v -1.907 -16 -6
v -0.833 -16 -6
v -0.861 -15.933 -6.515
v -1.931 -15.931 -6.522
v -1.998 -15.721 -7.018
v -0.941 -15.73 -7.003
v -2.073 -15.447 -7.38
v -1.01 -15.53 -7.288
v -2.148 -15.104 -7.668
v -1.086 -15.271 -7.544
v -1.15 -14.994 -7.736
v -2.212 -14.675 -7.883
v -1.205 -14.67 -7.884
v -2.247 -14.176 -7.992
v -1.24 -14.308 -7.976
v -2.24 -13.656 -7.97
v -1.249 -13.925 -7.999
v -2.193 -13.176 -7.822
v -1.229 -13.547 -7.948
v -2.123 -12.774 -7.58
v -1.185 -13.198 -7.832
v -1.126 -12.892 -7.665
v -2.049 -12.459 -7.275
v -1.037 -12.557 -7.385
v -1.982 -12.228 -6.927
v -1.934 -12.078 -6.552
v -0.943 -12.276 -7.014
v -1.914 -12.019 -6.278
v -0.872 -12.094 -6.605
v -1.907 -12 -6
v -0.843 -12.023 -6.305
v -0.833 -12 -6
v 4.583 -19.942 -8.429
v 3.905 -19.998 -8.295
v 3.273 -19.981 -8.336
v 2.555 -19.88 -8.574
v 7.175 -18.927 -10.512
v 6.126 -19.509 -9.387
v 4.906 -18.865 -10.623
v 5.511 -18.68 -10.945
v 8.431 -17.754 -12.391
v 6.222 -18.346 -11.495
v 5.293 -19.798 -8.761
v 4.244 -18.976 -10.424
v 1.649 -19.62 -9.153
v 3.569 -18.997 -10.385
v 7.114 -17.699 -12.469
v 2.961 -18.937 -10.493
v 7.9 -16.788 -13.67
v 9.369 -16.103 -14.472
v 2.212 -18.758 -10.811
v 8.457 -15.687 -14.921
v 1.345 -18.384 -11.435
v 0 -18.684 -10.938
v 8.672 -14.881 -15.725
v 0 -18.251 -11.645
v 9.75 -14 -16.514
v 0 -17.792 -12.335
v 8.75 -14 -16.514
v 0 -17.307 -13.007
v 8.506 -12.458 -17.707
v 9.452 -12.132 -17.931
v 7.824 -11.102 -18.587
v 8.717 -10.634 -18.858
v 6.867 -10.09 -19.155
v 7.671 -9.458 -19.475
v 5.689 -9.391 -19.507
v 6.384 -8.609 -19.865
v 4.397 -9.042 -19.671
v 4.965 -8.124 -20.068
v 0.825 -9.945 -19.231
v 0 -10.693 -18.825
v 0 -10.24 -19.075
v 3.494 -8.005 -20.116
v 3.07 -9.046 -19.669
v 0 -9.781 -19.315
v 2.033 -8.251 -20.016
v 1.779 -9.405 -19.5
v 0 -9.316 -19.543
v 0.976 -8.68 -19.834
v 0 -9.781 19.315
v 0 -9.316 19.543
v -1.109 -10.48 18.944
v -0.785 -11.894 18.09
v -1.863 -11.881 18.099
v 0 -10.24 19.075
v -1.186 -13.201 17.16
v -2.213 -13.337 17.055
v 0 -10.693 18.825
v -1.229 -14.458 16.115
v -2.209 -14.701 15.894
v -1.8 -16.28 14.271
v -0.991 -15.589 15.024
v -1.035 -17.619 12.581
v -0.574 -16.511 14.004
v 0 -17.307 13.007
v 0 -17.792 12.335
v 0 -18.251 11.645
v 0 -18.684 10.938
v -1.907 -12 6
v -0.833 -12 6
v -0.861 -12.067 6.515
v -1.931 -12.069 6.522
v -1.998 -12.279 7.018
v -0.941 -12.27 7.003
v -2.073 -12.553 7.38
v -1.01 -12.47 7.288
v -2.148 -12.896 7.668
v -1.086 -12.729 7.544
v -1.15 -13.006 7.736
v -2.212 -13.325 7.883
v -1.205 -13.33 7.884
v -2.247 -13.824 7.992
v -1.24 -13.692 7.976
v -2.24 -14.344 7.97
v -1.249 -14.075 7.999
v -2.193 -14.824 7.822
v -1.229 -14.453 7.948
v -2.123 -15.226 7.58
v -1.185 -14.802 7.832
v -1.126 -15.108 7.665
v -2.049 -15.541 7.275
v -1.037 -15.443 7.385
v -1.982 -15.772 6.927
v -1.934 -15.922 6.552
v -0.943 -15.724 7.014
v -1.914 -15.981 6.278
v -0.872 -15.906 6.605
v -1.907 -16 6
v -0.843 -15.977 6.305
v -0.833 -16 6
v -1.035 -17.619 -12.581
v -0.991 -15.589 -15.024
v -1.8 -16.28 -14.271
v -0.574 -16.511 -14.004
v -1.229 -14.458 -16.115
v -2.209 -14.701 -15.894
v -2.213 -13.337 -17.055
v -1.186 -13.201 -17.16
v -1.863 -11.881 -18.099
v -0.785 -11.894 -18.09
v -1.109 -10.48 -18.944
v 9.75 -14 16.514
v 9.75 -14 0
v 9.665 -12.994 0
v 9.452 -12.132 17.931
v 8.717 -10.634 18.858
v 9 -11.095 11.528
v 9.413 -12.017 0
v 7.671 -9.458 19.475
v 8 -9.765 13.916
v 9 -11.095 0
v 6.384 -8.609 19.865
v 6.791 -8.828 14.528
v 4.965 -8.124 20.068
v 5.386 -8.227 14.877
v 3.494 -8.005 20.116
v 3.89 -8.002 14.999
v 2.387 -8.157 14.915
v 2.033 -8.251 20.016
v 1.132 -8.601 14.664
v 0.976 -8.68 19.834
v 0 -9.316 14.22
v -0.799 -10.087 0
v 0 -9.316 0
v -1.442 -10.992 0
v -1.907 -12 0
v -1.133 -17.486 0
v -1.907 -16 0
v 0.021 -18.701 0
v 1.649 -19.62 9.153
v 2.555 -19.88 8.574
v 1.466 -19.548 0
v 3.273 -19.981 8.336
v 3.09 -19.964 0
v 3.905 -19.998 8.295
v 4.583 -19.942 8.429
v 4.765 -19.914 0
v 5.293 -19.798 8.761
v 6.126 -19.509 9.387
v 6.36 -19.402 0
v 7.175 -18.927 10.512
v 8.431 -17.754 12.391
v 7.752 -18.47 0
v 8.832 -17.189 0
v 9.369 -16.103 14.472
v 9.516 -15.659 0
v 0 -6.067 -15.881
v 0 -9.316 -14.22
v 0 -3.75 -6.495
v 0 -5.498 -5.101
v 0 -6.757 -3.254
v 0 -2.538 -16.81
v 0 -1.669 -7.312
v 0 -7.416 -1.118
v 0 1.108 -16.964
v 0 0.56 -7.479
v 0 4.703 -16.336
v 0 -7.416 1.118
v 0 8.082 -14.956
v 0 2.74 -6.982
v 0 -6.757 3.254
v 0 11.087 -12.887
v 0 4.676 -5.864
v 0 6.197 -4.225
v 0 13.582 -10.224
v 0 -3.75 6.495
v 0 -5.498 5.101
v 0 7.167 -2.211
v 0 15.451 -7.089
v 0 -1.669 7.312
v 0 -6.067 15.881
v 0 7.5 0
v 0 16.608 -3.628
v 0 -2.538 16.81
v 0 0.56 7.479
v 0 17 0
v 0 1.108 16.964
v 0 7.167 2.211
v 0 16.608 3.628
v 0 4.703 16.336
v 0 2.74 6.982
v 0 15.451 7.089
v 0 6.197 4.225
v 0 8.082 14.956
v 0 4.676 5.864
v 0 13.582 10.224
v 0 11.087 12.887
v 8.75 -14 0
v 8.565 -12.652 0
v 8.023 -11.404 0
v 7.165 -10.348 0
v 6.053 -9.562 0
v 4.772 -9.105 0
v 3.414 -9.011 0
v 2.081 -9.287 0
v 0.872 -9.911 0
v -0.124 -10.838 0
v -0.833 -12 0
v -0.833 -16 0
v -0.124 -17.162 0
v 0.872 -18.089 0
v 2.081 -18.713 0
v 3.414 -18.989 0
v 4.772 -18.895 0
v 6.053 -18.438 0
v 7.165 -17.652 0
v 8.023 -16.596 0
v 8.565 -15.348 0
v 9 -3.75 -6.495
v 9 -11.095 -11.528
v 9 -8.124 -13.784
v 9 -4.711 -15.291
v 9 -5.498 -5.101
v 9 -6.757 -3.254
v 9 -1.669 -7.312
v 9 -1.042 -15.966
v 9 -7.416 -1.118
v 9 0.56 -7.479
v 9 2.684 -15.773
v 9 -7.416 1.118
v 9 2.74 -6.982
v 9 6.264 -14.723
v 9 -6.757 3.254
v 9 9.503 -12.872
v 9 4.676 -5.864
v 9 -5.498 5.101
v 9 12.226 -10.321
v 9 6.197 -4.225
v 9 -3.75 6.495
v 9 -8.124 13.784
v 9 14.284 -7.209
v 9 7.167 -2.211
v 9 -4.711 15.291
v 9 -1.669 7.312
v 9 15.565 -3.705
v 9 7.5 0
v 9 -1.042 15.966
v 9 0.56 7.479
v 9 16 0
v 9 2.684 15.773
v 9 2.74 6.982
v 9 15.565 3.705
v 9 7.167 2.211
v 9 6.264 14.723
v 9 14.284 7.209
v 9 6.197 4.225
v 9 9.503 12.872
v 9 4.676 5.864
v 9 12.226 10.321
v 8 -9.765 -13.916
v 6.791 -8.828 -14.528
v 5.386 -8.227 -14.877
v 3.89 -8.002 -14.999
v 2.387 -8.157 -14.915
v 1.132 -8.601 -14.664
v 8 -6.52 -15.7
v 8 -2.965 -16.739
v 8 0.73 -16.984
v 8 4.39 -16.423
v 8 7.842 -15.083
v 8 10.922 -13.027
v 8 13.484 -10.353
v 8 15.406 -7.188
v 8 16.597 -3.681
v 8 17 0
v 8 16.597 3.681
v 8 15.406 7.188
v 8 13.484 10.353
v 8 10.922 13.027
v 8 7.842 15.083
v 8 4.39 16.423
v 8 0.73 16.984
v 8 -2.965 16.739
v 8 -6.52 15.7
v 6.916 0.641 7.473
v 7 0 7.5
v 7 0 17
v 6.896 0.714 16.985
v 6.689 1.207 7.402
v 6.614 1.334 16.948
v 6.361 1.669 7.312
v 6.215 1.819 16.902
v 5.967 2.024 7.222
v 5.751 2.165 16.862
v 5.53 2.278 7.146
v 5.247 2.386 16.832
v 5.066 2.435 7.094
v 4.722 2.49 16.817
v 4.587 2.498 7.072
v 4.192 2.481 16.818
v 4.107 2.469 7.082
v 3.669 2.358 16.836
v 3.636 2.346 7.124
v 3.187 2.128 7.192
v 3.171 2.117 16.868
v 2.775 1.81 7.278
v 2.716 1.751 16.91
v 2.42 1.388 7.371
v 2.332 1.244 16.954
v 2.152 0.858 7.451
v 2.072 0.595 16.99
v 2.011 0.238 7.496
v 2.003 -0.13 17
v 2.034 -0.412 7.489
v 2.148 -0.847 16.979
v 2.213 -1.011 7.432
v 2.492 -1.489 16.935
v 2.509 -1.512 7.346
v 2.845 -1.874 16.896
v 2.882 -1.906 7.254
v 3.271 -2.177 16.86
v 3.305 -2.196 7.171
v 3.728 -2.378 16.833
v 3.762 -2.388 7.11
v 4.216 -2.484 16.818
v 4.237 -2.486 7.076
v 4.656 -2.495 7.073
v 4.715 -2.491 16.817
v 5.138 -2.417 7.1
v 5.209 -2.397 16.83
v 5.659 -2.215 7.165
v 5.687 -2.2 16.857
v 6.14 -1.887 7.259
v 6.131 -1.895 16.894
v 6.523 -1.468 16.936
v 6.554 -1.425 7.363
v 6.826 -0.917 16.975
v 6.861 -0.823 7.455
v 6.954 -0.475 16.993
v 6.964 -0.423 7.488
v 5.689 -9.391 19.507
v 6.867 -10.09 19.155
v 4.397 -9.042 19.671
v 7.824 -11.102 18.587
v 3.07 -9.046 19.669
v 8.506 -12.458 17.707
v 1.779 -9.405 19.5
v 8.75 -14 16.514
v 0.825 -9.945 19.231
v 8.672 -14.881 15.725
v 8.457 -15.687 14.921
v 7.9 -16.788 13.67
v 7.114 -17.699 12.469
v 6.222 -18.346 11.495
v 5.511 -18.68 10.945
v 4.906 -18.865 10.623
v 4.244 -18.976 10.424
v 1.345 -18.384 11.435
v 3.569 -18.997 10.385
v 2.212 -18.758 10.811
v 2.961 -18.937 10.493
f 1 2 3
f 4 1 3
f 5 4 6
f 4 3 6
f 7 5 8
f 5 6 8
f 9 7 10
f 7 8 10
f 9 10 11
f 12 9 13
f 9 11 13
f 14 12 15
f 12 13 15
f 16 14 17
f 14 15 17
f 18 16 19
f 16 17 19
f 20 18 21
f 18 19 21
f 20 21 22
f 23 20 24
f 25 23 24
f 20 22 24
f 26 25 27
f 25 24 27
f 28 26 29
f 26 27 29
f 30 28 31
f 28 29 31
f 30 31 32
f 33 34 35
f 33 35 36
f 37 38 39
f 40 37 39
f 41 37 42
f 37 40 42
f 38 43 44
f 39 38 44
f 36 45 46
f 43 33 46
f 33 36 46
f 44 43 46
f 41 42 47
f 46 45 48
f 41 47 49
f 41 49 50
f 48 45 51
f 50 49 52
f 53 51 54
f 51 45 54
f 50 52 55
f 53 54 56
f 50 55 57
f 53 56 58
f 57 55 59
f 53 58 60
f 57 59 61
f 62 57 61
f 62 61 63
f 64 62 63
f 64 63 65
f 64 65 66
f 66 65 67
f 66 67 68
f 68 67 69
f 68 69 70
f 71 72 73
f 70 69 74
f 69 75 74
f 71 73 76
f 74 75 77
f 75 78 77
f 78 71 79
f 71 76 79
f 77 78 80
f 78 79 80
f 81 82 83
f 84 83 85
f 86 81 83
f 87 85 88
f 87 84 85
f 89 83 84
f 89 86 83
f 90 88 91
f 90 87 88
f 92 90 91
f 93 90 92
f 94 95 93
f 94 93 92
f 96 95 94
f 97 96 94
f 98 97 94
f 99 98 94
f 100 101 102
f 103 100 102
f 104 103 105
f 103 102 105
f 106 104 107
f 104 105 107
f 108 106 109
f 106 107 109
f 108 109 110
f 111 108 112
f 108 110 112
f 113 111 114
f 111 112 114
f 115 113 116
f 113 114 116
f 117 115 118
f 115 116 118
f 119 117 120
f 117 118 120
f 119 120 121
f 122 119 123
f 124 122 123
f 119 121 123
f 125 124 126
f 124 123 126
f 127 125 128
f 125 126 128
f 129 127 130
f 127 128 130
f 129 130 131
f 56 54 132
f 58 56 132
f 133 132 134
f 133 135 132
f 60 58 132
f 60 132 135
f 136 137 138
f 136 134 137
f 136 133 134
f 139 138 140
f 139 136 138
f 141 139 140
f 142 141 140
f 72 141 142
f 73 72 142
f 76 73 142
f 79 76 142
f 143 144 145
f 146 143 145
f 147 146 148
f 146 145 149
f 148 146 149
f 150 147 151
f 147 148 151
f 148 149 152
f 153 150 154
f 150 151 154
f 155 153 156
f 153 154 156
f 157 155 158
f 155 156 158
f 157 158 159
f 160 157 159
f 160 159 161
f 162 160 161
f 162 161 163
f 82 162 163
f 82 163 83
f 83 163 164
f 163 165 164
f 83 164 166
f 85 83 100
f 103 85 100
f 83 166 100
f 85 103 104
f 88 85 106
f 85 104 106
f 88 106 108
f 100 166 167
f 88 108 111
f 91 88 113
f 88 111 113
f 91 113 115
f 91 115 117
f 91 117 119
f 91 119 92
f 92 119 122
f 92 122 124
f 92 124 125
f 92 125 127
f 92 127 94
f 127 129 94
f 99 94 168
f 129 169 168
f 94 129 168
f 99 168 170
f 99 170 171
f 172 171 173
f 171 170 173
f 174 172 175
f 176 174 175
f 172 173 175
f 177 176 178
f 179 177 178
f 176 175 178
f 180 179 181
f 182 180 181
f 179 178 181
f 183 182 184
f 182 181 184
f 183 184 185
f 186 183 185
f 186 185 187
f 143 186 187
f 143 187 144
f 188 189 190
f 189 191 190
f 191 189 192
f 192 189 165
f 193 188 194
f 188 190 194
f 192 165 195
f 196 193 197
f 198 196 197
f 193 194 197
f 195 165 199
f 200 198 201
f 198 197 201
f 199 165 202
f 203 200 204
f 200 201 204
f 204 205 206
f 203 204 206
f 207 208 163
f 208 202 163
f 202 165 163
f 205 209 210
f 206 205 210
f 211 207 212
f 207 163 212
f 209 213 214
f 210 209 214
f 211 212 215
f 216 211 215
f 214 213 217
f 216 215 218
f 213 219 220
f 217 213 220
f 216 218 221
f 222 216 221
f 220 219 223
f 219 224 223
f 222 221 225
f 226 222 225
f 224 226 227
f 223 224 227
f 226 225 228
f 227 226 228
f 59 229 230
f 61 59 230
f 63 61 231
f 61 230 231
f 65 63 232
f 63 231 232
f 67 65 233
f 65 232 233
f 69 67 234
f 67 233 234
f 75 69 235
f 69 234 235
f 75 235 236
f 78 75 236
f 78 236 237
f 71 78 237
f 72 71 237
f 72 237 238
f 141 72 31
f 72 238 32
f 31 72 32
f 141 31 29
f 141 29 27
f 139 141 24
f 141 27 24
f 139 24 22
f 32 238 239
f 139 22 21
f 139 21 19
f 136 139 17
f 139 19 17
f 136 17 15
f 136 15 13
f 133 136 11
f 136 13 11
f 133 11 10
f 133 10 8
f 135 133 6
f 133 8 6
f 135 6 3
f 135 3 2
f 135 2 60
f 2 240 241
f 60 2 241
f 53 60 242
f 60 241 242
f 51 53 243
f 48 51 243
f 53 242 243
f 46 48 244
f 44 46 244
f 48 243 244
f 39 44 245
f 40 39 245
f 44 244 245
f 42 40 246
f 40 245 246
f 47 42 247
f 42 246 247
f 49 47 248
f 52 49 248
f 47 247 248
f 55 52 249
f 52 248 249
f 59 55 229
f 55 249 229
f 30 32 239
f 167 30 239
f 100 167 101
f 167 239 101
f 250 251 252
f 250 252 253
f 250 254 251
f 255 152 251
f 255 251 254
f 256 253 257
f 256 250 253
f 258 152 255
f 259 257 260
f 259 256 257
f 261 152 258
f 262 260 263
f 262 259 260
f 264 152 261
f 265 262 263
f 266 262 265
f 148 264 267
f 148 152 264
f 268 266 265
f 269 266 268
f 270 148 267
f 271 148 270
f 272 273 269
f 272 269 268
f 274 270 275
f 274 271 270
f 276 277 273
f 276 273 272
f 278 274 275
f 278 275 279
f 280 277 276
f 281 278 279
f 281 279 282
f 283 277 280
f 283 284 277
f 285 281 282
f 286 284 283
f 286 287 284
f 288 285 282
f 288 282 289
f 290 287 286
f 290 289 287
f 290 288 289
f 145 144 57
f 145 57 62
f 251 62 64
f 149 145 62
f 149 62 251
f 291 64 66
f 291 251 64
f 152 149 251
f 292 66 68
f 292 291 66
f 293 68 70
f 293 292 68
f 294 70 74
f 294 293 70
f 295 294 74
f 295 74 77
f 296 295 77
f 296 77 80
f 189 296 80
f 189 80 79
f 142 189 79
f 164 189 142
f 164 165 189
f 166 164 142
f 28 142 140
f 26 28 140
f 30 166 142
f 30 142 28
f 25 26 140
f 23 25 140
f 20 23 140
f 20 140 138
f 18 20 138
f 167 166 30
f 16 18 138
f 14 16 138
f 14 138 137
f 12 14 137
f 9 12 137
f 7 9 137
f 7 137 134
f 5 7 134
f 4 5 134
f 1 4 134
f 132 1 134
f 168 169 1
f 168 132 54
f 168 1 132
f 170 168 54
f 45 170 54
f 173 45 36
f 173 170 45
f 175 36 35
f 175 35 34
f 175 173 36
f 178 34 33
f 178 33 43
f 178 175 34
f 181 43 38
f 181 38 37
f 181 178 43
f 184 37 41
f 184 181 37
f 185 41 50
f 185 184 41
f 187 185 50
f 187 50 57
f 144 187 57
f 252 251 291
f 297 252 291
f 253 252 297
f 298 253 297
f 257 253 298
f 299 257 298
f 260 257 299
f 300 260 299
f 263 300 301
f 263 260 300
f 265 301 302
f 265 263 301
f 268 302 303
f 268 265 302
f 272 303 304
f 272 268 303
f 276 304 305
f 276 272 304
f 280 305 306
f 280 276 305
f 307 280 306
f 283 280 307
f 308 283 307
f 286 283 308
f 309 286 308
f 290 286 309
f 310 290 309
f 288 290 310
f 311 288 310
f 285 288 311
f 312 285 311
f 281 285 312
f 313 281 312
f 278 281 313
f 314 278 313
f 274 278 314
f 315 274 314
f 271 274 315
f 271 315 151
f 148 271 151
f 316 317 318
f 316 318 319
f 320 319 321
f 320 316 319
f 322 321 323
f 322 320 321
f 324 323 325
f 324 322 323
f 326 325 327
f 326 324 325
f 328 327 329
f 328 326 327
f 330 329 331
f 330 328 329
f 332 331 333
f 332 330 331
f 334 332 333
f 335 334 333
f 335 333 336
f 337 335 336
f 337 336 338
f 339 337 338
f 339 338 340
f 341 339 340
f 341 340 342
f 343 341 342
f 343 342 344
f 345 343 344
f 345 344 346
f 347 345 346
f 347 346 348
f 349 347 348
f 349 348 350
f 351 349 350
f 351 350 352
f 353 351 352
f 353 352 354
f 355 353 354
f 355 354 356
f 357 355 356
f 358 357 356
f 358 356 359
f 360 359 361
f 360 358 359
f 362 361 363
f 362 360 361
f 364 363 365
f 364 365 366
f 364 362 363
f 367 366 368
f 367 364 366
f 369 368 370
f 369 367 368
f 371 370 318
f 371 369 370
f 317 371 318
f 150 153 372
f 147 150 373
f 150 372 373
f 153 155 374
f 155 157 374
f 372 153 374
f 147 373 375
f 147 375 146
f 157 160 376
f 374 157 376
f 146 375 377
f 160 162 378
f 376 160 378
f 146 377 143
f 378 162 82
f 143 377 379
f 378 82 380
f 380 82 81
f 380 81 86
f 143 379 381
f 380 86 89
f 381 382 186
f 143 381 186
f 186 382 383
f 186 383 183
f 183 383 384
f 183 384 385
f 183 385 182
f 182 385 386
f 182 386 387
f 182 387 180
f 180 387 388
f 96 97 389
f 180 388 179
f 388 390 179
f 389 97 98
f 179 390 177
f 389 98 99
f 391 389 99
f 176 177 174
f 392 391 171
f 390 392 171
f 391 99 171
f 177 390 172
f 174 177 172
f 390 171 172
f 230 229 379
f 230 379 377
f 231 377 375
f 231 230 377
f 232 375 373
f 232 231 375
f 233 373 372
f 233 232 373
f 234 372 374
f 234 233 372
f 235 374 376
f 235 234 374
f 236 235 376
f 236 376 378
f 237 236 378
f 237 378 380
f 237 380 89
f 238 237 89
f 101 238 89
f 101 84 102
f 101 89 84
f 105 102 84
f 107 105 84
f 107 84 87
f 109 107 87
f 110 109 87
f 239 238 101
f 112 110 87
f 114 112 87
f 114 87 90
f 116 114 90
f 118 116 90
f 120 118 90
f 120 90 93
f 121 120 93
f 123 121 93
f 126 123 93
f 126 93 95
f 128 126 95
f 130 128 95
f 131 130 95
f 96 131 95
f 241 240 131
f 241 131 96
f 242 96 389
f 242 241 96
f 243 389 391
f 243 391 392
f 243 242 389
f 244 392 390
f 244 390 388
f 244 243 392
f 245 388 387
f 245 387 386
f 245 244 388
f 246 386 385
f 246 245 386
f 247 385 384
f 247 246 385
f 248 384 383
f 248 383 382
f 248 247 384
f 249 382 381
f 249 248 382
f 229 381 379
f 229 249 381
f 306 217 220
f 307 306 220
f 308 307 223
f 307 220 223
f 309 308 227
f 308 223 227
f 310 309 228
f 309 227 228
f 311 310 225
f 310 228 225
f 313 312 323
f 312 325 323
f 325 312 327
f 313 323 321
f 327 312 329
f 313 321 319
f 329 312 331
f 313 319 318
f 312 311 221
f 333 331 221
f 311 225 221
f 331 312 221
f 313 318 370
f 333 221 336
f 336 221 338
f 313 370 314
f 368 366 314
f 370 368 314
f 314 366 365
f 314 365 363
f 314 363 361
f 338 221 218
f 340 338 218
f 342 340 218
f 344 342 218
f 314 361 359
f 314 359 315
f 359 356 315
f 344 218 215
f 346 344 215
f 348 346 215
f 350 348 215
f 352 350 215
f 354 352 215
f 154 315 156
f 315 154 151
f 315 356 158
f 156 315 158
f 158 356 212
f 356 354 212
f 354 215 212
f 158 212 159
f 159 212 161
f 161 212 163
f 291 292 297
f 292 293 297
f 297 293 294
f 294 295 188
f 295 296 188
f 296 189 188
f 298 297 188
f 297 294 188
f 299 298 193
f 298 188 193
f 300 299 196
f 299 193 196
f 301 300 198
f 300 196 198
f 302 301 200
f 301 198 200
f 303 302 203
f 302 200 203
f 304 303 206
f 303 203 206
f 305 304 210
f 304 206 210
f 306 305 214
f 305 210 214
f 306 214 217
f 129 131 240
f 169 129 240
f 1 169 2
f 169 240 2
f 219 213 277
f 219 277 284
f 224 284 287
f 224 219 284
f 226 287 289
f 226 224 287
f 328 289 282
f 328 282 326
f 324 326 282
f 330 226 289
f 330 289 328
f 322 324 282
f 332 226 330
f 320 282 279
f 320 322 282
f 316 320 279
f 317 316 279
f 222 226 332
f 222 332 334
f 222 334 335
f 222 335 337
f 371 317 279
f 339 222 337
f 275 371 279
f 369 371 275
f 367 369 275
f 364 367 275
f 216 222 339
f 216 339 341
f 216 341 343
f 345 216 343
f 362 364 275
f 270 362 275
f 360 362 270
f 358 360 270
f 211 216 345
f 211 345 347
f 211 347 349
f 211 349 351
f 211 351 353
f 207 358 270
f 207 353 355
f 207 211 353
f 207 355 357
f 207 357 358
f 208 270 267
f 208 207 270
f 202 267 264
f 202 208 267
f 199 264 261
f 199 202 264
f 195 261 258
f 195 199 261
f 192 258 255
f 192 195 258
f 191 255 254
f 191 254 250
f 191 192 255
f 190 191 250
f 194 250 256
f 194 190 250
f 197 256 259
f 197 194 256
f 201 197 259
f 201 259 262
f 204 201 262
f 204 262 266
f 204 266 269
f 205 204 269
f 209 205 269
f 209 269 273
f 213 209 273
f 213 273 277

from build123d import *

# Parameters (mm, degrees)
F0_R           = 17
F0_R_2         = 7.5
F1_DEPTH       = 9
F3_SIZE        = 1
F2_R           = 2.5
F4_DEPTH       = 25
F5_R           = 6
F6_DEPTH       = 25
F6_DEPTH_BACK  = 25
F7_R           = 36.9830222821
F7_R_2         = 21.65
F8_DEPTH       = 25
F8_DEPTH_BACK  = 25
F9_R           = 5
F10_DEPTH      = 25
F10_DEPTH_BACK = 25
F12_DEPTH      = 25


with BuildPart() as f1:
    # F0 (on Right) → F1 (new body)
    with BuildSketch(Plane.YZ):
        Circle(F0_R)
        Circle(F0_R_2, mode=Mode.SUBTRACT)
    extrude(amount=F1_DEPTH)

    # F3
    f3_edges = [f1.edges().sort_by_distance(p)[0] for p in [
        (9, -17, 0),
    ]]
    chamfer(f3_edges, length=F3_SIZE)

    # F2 (on Top) → F4 (cut)
    with BuildSketch(Plane.XY):
        with Locations((4.5, 0)):
            Circle(F2_R)
    extrude(amount=F4_DEPTH, mode=Mode.SUBTRACT)

    # F5 (on Top) → F6 (join, two sides)
    with BuildSketch(Plane.XY) as f6_sk:
        with Locations((3.75, -14)):
            Circle(F5_R)
    extrude(amount=F6_DEPTH)
    extrude(f6_sk.sketch, amount=-F6_DEPTH_BACK)

    # F7 (on Right) → F8 (cut, two sides)
    with BuildSketch(Plane.YZ) as f8_sk:
        Circle(F7_R)
        Circle(F7_R_2, mode=Mode.SUBTRACT)
    extrude(amount=F8_DEPTH, mode=Mode.SUBTRACT)
    extrude(f8_sk.sketch, amount=-F8_DEPTH_BACK, mode=Mode.SUBTRACT)

    # F9 (on Top) → F10 (cut, two sides)
    with BuildSketch(Plane.XY) as f10_sk:
        with Locations((3.75, -14)):
            Circle(F9_R)
    extrude(amount=-F10_DEPTH, mode=Mode.SUBTRACT)
    extrude(f10_sk.sketch, amount=F10_DEPTH_BACK, mode=Mode.SUBTRACT)

    # F11 (on Right) → F12 (cut)
    with BuildSketch(Plane.YZ):
        with BuildLine():
            Line((-12, -6), (-12, 6))
            ThreePointArc((-12, 6), (-14, 8), (-16, 6))
            Line((-16, 6), (-16, -6))
            ThreePointArc((-16, -6), (-14, -8), (-12, -6))
        make_face()
    extrude(amount=-F12_DEPTH, mode=Mode.SUBTRACT)


solid = f1.part
